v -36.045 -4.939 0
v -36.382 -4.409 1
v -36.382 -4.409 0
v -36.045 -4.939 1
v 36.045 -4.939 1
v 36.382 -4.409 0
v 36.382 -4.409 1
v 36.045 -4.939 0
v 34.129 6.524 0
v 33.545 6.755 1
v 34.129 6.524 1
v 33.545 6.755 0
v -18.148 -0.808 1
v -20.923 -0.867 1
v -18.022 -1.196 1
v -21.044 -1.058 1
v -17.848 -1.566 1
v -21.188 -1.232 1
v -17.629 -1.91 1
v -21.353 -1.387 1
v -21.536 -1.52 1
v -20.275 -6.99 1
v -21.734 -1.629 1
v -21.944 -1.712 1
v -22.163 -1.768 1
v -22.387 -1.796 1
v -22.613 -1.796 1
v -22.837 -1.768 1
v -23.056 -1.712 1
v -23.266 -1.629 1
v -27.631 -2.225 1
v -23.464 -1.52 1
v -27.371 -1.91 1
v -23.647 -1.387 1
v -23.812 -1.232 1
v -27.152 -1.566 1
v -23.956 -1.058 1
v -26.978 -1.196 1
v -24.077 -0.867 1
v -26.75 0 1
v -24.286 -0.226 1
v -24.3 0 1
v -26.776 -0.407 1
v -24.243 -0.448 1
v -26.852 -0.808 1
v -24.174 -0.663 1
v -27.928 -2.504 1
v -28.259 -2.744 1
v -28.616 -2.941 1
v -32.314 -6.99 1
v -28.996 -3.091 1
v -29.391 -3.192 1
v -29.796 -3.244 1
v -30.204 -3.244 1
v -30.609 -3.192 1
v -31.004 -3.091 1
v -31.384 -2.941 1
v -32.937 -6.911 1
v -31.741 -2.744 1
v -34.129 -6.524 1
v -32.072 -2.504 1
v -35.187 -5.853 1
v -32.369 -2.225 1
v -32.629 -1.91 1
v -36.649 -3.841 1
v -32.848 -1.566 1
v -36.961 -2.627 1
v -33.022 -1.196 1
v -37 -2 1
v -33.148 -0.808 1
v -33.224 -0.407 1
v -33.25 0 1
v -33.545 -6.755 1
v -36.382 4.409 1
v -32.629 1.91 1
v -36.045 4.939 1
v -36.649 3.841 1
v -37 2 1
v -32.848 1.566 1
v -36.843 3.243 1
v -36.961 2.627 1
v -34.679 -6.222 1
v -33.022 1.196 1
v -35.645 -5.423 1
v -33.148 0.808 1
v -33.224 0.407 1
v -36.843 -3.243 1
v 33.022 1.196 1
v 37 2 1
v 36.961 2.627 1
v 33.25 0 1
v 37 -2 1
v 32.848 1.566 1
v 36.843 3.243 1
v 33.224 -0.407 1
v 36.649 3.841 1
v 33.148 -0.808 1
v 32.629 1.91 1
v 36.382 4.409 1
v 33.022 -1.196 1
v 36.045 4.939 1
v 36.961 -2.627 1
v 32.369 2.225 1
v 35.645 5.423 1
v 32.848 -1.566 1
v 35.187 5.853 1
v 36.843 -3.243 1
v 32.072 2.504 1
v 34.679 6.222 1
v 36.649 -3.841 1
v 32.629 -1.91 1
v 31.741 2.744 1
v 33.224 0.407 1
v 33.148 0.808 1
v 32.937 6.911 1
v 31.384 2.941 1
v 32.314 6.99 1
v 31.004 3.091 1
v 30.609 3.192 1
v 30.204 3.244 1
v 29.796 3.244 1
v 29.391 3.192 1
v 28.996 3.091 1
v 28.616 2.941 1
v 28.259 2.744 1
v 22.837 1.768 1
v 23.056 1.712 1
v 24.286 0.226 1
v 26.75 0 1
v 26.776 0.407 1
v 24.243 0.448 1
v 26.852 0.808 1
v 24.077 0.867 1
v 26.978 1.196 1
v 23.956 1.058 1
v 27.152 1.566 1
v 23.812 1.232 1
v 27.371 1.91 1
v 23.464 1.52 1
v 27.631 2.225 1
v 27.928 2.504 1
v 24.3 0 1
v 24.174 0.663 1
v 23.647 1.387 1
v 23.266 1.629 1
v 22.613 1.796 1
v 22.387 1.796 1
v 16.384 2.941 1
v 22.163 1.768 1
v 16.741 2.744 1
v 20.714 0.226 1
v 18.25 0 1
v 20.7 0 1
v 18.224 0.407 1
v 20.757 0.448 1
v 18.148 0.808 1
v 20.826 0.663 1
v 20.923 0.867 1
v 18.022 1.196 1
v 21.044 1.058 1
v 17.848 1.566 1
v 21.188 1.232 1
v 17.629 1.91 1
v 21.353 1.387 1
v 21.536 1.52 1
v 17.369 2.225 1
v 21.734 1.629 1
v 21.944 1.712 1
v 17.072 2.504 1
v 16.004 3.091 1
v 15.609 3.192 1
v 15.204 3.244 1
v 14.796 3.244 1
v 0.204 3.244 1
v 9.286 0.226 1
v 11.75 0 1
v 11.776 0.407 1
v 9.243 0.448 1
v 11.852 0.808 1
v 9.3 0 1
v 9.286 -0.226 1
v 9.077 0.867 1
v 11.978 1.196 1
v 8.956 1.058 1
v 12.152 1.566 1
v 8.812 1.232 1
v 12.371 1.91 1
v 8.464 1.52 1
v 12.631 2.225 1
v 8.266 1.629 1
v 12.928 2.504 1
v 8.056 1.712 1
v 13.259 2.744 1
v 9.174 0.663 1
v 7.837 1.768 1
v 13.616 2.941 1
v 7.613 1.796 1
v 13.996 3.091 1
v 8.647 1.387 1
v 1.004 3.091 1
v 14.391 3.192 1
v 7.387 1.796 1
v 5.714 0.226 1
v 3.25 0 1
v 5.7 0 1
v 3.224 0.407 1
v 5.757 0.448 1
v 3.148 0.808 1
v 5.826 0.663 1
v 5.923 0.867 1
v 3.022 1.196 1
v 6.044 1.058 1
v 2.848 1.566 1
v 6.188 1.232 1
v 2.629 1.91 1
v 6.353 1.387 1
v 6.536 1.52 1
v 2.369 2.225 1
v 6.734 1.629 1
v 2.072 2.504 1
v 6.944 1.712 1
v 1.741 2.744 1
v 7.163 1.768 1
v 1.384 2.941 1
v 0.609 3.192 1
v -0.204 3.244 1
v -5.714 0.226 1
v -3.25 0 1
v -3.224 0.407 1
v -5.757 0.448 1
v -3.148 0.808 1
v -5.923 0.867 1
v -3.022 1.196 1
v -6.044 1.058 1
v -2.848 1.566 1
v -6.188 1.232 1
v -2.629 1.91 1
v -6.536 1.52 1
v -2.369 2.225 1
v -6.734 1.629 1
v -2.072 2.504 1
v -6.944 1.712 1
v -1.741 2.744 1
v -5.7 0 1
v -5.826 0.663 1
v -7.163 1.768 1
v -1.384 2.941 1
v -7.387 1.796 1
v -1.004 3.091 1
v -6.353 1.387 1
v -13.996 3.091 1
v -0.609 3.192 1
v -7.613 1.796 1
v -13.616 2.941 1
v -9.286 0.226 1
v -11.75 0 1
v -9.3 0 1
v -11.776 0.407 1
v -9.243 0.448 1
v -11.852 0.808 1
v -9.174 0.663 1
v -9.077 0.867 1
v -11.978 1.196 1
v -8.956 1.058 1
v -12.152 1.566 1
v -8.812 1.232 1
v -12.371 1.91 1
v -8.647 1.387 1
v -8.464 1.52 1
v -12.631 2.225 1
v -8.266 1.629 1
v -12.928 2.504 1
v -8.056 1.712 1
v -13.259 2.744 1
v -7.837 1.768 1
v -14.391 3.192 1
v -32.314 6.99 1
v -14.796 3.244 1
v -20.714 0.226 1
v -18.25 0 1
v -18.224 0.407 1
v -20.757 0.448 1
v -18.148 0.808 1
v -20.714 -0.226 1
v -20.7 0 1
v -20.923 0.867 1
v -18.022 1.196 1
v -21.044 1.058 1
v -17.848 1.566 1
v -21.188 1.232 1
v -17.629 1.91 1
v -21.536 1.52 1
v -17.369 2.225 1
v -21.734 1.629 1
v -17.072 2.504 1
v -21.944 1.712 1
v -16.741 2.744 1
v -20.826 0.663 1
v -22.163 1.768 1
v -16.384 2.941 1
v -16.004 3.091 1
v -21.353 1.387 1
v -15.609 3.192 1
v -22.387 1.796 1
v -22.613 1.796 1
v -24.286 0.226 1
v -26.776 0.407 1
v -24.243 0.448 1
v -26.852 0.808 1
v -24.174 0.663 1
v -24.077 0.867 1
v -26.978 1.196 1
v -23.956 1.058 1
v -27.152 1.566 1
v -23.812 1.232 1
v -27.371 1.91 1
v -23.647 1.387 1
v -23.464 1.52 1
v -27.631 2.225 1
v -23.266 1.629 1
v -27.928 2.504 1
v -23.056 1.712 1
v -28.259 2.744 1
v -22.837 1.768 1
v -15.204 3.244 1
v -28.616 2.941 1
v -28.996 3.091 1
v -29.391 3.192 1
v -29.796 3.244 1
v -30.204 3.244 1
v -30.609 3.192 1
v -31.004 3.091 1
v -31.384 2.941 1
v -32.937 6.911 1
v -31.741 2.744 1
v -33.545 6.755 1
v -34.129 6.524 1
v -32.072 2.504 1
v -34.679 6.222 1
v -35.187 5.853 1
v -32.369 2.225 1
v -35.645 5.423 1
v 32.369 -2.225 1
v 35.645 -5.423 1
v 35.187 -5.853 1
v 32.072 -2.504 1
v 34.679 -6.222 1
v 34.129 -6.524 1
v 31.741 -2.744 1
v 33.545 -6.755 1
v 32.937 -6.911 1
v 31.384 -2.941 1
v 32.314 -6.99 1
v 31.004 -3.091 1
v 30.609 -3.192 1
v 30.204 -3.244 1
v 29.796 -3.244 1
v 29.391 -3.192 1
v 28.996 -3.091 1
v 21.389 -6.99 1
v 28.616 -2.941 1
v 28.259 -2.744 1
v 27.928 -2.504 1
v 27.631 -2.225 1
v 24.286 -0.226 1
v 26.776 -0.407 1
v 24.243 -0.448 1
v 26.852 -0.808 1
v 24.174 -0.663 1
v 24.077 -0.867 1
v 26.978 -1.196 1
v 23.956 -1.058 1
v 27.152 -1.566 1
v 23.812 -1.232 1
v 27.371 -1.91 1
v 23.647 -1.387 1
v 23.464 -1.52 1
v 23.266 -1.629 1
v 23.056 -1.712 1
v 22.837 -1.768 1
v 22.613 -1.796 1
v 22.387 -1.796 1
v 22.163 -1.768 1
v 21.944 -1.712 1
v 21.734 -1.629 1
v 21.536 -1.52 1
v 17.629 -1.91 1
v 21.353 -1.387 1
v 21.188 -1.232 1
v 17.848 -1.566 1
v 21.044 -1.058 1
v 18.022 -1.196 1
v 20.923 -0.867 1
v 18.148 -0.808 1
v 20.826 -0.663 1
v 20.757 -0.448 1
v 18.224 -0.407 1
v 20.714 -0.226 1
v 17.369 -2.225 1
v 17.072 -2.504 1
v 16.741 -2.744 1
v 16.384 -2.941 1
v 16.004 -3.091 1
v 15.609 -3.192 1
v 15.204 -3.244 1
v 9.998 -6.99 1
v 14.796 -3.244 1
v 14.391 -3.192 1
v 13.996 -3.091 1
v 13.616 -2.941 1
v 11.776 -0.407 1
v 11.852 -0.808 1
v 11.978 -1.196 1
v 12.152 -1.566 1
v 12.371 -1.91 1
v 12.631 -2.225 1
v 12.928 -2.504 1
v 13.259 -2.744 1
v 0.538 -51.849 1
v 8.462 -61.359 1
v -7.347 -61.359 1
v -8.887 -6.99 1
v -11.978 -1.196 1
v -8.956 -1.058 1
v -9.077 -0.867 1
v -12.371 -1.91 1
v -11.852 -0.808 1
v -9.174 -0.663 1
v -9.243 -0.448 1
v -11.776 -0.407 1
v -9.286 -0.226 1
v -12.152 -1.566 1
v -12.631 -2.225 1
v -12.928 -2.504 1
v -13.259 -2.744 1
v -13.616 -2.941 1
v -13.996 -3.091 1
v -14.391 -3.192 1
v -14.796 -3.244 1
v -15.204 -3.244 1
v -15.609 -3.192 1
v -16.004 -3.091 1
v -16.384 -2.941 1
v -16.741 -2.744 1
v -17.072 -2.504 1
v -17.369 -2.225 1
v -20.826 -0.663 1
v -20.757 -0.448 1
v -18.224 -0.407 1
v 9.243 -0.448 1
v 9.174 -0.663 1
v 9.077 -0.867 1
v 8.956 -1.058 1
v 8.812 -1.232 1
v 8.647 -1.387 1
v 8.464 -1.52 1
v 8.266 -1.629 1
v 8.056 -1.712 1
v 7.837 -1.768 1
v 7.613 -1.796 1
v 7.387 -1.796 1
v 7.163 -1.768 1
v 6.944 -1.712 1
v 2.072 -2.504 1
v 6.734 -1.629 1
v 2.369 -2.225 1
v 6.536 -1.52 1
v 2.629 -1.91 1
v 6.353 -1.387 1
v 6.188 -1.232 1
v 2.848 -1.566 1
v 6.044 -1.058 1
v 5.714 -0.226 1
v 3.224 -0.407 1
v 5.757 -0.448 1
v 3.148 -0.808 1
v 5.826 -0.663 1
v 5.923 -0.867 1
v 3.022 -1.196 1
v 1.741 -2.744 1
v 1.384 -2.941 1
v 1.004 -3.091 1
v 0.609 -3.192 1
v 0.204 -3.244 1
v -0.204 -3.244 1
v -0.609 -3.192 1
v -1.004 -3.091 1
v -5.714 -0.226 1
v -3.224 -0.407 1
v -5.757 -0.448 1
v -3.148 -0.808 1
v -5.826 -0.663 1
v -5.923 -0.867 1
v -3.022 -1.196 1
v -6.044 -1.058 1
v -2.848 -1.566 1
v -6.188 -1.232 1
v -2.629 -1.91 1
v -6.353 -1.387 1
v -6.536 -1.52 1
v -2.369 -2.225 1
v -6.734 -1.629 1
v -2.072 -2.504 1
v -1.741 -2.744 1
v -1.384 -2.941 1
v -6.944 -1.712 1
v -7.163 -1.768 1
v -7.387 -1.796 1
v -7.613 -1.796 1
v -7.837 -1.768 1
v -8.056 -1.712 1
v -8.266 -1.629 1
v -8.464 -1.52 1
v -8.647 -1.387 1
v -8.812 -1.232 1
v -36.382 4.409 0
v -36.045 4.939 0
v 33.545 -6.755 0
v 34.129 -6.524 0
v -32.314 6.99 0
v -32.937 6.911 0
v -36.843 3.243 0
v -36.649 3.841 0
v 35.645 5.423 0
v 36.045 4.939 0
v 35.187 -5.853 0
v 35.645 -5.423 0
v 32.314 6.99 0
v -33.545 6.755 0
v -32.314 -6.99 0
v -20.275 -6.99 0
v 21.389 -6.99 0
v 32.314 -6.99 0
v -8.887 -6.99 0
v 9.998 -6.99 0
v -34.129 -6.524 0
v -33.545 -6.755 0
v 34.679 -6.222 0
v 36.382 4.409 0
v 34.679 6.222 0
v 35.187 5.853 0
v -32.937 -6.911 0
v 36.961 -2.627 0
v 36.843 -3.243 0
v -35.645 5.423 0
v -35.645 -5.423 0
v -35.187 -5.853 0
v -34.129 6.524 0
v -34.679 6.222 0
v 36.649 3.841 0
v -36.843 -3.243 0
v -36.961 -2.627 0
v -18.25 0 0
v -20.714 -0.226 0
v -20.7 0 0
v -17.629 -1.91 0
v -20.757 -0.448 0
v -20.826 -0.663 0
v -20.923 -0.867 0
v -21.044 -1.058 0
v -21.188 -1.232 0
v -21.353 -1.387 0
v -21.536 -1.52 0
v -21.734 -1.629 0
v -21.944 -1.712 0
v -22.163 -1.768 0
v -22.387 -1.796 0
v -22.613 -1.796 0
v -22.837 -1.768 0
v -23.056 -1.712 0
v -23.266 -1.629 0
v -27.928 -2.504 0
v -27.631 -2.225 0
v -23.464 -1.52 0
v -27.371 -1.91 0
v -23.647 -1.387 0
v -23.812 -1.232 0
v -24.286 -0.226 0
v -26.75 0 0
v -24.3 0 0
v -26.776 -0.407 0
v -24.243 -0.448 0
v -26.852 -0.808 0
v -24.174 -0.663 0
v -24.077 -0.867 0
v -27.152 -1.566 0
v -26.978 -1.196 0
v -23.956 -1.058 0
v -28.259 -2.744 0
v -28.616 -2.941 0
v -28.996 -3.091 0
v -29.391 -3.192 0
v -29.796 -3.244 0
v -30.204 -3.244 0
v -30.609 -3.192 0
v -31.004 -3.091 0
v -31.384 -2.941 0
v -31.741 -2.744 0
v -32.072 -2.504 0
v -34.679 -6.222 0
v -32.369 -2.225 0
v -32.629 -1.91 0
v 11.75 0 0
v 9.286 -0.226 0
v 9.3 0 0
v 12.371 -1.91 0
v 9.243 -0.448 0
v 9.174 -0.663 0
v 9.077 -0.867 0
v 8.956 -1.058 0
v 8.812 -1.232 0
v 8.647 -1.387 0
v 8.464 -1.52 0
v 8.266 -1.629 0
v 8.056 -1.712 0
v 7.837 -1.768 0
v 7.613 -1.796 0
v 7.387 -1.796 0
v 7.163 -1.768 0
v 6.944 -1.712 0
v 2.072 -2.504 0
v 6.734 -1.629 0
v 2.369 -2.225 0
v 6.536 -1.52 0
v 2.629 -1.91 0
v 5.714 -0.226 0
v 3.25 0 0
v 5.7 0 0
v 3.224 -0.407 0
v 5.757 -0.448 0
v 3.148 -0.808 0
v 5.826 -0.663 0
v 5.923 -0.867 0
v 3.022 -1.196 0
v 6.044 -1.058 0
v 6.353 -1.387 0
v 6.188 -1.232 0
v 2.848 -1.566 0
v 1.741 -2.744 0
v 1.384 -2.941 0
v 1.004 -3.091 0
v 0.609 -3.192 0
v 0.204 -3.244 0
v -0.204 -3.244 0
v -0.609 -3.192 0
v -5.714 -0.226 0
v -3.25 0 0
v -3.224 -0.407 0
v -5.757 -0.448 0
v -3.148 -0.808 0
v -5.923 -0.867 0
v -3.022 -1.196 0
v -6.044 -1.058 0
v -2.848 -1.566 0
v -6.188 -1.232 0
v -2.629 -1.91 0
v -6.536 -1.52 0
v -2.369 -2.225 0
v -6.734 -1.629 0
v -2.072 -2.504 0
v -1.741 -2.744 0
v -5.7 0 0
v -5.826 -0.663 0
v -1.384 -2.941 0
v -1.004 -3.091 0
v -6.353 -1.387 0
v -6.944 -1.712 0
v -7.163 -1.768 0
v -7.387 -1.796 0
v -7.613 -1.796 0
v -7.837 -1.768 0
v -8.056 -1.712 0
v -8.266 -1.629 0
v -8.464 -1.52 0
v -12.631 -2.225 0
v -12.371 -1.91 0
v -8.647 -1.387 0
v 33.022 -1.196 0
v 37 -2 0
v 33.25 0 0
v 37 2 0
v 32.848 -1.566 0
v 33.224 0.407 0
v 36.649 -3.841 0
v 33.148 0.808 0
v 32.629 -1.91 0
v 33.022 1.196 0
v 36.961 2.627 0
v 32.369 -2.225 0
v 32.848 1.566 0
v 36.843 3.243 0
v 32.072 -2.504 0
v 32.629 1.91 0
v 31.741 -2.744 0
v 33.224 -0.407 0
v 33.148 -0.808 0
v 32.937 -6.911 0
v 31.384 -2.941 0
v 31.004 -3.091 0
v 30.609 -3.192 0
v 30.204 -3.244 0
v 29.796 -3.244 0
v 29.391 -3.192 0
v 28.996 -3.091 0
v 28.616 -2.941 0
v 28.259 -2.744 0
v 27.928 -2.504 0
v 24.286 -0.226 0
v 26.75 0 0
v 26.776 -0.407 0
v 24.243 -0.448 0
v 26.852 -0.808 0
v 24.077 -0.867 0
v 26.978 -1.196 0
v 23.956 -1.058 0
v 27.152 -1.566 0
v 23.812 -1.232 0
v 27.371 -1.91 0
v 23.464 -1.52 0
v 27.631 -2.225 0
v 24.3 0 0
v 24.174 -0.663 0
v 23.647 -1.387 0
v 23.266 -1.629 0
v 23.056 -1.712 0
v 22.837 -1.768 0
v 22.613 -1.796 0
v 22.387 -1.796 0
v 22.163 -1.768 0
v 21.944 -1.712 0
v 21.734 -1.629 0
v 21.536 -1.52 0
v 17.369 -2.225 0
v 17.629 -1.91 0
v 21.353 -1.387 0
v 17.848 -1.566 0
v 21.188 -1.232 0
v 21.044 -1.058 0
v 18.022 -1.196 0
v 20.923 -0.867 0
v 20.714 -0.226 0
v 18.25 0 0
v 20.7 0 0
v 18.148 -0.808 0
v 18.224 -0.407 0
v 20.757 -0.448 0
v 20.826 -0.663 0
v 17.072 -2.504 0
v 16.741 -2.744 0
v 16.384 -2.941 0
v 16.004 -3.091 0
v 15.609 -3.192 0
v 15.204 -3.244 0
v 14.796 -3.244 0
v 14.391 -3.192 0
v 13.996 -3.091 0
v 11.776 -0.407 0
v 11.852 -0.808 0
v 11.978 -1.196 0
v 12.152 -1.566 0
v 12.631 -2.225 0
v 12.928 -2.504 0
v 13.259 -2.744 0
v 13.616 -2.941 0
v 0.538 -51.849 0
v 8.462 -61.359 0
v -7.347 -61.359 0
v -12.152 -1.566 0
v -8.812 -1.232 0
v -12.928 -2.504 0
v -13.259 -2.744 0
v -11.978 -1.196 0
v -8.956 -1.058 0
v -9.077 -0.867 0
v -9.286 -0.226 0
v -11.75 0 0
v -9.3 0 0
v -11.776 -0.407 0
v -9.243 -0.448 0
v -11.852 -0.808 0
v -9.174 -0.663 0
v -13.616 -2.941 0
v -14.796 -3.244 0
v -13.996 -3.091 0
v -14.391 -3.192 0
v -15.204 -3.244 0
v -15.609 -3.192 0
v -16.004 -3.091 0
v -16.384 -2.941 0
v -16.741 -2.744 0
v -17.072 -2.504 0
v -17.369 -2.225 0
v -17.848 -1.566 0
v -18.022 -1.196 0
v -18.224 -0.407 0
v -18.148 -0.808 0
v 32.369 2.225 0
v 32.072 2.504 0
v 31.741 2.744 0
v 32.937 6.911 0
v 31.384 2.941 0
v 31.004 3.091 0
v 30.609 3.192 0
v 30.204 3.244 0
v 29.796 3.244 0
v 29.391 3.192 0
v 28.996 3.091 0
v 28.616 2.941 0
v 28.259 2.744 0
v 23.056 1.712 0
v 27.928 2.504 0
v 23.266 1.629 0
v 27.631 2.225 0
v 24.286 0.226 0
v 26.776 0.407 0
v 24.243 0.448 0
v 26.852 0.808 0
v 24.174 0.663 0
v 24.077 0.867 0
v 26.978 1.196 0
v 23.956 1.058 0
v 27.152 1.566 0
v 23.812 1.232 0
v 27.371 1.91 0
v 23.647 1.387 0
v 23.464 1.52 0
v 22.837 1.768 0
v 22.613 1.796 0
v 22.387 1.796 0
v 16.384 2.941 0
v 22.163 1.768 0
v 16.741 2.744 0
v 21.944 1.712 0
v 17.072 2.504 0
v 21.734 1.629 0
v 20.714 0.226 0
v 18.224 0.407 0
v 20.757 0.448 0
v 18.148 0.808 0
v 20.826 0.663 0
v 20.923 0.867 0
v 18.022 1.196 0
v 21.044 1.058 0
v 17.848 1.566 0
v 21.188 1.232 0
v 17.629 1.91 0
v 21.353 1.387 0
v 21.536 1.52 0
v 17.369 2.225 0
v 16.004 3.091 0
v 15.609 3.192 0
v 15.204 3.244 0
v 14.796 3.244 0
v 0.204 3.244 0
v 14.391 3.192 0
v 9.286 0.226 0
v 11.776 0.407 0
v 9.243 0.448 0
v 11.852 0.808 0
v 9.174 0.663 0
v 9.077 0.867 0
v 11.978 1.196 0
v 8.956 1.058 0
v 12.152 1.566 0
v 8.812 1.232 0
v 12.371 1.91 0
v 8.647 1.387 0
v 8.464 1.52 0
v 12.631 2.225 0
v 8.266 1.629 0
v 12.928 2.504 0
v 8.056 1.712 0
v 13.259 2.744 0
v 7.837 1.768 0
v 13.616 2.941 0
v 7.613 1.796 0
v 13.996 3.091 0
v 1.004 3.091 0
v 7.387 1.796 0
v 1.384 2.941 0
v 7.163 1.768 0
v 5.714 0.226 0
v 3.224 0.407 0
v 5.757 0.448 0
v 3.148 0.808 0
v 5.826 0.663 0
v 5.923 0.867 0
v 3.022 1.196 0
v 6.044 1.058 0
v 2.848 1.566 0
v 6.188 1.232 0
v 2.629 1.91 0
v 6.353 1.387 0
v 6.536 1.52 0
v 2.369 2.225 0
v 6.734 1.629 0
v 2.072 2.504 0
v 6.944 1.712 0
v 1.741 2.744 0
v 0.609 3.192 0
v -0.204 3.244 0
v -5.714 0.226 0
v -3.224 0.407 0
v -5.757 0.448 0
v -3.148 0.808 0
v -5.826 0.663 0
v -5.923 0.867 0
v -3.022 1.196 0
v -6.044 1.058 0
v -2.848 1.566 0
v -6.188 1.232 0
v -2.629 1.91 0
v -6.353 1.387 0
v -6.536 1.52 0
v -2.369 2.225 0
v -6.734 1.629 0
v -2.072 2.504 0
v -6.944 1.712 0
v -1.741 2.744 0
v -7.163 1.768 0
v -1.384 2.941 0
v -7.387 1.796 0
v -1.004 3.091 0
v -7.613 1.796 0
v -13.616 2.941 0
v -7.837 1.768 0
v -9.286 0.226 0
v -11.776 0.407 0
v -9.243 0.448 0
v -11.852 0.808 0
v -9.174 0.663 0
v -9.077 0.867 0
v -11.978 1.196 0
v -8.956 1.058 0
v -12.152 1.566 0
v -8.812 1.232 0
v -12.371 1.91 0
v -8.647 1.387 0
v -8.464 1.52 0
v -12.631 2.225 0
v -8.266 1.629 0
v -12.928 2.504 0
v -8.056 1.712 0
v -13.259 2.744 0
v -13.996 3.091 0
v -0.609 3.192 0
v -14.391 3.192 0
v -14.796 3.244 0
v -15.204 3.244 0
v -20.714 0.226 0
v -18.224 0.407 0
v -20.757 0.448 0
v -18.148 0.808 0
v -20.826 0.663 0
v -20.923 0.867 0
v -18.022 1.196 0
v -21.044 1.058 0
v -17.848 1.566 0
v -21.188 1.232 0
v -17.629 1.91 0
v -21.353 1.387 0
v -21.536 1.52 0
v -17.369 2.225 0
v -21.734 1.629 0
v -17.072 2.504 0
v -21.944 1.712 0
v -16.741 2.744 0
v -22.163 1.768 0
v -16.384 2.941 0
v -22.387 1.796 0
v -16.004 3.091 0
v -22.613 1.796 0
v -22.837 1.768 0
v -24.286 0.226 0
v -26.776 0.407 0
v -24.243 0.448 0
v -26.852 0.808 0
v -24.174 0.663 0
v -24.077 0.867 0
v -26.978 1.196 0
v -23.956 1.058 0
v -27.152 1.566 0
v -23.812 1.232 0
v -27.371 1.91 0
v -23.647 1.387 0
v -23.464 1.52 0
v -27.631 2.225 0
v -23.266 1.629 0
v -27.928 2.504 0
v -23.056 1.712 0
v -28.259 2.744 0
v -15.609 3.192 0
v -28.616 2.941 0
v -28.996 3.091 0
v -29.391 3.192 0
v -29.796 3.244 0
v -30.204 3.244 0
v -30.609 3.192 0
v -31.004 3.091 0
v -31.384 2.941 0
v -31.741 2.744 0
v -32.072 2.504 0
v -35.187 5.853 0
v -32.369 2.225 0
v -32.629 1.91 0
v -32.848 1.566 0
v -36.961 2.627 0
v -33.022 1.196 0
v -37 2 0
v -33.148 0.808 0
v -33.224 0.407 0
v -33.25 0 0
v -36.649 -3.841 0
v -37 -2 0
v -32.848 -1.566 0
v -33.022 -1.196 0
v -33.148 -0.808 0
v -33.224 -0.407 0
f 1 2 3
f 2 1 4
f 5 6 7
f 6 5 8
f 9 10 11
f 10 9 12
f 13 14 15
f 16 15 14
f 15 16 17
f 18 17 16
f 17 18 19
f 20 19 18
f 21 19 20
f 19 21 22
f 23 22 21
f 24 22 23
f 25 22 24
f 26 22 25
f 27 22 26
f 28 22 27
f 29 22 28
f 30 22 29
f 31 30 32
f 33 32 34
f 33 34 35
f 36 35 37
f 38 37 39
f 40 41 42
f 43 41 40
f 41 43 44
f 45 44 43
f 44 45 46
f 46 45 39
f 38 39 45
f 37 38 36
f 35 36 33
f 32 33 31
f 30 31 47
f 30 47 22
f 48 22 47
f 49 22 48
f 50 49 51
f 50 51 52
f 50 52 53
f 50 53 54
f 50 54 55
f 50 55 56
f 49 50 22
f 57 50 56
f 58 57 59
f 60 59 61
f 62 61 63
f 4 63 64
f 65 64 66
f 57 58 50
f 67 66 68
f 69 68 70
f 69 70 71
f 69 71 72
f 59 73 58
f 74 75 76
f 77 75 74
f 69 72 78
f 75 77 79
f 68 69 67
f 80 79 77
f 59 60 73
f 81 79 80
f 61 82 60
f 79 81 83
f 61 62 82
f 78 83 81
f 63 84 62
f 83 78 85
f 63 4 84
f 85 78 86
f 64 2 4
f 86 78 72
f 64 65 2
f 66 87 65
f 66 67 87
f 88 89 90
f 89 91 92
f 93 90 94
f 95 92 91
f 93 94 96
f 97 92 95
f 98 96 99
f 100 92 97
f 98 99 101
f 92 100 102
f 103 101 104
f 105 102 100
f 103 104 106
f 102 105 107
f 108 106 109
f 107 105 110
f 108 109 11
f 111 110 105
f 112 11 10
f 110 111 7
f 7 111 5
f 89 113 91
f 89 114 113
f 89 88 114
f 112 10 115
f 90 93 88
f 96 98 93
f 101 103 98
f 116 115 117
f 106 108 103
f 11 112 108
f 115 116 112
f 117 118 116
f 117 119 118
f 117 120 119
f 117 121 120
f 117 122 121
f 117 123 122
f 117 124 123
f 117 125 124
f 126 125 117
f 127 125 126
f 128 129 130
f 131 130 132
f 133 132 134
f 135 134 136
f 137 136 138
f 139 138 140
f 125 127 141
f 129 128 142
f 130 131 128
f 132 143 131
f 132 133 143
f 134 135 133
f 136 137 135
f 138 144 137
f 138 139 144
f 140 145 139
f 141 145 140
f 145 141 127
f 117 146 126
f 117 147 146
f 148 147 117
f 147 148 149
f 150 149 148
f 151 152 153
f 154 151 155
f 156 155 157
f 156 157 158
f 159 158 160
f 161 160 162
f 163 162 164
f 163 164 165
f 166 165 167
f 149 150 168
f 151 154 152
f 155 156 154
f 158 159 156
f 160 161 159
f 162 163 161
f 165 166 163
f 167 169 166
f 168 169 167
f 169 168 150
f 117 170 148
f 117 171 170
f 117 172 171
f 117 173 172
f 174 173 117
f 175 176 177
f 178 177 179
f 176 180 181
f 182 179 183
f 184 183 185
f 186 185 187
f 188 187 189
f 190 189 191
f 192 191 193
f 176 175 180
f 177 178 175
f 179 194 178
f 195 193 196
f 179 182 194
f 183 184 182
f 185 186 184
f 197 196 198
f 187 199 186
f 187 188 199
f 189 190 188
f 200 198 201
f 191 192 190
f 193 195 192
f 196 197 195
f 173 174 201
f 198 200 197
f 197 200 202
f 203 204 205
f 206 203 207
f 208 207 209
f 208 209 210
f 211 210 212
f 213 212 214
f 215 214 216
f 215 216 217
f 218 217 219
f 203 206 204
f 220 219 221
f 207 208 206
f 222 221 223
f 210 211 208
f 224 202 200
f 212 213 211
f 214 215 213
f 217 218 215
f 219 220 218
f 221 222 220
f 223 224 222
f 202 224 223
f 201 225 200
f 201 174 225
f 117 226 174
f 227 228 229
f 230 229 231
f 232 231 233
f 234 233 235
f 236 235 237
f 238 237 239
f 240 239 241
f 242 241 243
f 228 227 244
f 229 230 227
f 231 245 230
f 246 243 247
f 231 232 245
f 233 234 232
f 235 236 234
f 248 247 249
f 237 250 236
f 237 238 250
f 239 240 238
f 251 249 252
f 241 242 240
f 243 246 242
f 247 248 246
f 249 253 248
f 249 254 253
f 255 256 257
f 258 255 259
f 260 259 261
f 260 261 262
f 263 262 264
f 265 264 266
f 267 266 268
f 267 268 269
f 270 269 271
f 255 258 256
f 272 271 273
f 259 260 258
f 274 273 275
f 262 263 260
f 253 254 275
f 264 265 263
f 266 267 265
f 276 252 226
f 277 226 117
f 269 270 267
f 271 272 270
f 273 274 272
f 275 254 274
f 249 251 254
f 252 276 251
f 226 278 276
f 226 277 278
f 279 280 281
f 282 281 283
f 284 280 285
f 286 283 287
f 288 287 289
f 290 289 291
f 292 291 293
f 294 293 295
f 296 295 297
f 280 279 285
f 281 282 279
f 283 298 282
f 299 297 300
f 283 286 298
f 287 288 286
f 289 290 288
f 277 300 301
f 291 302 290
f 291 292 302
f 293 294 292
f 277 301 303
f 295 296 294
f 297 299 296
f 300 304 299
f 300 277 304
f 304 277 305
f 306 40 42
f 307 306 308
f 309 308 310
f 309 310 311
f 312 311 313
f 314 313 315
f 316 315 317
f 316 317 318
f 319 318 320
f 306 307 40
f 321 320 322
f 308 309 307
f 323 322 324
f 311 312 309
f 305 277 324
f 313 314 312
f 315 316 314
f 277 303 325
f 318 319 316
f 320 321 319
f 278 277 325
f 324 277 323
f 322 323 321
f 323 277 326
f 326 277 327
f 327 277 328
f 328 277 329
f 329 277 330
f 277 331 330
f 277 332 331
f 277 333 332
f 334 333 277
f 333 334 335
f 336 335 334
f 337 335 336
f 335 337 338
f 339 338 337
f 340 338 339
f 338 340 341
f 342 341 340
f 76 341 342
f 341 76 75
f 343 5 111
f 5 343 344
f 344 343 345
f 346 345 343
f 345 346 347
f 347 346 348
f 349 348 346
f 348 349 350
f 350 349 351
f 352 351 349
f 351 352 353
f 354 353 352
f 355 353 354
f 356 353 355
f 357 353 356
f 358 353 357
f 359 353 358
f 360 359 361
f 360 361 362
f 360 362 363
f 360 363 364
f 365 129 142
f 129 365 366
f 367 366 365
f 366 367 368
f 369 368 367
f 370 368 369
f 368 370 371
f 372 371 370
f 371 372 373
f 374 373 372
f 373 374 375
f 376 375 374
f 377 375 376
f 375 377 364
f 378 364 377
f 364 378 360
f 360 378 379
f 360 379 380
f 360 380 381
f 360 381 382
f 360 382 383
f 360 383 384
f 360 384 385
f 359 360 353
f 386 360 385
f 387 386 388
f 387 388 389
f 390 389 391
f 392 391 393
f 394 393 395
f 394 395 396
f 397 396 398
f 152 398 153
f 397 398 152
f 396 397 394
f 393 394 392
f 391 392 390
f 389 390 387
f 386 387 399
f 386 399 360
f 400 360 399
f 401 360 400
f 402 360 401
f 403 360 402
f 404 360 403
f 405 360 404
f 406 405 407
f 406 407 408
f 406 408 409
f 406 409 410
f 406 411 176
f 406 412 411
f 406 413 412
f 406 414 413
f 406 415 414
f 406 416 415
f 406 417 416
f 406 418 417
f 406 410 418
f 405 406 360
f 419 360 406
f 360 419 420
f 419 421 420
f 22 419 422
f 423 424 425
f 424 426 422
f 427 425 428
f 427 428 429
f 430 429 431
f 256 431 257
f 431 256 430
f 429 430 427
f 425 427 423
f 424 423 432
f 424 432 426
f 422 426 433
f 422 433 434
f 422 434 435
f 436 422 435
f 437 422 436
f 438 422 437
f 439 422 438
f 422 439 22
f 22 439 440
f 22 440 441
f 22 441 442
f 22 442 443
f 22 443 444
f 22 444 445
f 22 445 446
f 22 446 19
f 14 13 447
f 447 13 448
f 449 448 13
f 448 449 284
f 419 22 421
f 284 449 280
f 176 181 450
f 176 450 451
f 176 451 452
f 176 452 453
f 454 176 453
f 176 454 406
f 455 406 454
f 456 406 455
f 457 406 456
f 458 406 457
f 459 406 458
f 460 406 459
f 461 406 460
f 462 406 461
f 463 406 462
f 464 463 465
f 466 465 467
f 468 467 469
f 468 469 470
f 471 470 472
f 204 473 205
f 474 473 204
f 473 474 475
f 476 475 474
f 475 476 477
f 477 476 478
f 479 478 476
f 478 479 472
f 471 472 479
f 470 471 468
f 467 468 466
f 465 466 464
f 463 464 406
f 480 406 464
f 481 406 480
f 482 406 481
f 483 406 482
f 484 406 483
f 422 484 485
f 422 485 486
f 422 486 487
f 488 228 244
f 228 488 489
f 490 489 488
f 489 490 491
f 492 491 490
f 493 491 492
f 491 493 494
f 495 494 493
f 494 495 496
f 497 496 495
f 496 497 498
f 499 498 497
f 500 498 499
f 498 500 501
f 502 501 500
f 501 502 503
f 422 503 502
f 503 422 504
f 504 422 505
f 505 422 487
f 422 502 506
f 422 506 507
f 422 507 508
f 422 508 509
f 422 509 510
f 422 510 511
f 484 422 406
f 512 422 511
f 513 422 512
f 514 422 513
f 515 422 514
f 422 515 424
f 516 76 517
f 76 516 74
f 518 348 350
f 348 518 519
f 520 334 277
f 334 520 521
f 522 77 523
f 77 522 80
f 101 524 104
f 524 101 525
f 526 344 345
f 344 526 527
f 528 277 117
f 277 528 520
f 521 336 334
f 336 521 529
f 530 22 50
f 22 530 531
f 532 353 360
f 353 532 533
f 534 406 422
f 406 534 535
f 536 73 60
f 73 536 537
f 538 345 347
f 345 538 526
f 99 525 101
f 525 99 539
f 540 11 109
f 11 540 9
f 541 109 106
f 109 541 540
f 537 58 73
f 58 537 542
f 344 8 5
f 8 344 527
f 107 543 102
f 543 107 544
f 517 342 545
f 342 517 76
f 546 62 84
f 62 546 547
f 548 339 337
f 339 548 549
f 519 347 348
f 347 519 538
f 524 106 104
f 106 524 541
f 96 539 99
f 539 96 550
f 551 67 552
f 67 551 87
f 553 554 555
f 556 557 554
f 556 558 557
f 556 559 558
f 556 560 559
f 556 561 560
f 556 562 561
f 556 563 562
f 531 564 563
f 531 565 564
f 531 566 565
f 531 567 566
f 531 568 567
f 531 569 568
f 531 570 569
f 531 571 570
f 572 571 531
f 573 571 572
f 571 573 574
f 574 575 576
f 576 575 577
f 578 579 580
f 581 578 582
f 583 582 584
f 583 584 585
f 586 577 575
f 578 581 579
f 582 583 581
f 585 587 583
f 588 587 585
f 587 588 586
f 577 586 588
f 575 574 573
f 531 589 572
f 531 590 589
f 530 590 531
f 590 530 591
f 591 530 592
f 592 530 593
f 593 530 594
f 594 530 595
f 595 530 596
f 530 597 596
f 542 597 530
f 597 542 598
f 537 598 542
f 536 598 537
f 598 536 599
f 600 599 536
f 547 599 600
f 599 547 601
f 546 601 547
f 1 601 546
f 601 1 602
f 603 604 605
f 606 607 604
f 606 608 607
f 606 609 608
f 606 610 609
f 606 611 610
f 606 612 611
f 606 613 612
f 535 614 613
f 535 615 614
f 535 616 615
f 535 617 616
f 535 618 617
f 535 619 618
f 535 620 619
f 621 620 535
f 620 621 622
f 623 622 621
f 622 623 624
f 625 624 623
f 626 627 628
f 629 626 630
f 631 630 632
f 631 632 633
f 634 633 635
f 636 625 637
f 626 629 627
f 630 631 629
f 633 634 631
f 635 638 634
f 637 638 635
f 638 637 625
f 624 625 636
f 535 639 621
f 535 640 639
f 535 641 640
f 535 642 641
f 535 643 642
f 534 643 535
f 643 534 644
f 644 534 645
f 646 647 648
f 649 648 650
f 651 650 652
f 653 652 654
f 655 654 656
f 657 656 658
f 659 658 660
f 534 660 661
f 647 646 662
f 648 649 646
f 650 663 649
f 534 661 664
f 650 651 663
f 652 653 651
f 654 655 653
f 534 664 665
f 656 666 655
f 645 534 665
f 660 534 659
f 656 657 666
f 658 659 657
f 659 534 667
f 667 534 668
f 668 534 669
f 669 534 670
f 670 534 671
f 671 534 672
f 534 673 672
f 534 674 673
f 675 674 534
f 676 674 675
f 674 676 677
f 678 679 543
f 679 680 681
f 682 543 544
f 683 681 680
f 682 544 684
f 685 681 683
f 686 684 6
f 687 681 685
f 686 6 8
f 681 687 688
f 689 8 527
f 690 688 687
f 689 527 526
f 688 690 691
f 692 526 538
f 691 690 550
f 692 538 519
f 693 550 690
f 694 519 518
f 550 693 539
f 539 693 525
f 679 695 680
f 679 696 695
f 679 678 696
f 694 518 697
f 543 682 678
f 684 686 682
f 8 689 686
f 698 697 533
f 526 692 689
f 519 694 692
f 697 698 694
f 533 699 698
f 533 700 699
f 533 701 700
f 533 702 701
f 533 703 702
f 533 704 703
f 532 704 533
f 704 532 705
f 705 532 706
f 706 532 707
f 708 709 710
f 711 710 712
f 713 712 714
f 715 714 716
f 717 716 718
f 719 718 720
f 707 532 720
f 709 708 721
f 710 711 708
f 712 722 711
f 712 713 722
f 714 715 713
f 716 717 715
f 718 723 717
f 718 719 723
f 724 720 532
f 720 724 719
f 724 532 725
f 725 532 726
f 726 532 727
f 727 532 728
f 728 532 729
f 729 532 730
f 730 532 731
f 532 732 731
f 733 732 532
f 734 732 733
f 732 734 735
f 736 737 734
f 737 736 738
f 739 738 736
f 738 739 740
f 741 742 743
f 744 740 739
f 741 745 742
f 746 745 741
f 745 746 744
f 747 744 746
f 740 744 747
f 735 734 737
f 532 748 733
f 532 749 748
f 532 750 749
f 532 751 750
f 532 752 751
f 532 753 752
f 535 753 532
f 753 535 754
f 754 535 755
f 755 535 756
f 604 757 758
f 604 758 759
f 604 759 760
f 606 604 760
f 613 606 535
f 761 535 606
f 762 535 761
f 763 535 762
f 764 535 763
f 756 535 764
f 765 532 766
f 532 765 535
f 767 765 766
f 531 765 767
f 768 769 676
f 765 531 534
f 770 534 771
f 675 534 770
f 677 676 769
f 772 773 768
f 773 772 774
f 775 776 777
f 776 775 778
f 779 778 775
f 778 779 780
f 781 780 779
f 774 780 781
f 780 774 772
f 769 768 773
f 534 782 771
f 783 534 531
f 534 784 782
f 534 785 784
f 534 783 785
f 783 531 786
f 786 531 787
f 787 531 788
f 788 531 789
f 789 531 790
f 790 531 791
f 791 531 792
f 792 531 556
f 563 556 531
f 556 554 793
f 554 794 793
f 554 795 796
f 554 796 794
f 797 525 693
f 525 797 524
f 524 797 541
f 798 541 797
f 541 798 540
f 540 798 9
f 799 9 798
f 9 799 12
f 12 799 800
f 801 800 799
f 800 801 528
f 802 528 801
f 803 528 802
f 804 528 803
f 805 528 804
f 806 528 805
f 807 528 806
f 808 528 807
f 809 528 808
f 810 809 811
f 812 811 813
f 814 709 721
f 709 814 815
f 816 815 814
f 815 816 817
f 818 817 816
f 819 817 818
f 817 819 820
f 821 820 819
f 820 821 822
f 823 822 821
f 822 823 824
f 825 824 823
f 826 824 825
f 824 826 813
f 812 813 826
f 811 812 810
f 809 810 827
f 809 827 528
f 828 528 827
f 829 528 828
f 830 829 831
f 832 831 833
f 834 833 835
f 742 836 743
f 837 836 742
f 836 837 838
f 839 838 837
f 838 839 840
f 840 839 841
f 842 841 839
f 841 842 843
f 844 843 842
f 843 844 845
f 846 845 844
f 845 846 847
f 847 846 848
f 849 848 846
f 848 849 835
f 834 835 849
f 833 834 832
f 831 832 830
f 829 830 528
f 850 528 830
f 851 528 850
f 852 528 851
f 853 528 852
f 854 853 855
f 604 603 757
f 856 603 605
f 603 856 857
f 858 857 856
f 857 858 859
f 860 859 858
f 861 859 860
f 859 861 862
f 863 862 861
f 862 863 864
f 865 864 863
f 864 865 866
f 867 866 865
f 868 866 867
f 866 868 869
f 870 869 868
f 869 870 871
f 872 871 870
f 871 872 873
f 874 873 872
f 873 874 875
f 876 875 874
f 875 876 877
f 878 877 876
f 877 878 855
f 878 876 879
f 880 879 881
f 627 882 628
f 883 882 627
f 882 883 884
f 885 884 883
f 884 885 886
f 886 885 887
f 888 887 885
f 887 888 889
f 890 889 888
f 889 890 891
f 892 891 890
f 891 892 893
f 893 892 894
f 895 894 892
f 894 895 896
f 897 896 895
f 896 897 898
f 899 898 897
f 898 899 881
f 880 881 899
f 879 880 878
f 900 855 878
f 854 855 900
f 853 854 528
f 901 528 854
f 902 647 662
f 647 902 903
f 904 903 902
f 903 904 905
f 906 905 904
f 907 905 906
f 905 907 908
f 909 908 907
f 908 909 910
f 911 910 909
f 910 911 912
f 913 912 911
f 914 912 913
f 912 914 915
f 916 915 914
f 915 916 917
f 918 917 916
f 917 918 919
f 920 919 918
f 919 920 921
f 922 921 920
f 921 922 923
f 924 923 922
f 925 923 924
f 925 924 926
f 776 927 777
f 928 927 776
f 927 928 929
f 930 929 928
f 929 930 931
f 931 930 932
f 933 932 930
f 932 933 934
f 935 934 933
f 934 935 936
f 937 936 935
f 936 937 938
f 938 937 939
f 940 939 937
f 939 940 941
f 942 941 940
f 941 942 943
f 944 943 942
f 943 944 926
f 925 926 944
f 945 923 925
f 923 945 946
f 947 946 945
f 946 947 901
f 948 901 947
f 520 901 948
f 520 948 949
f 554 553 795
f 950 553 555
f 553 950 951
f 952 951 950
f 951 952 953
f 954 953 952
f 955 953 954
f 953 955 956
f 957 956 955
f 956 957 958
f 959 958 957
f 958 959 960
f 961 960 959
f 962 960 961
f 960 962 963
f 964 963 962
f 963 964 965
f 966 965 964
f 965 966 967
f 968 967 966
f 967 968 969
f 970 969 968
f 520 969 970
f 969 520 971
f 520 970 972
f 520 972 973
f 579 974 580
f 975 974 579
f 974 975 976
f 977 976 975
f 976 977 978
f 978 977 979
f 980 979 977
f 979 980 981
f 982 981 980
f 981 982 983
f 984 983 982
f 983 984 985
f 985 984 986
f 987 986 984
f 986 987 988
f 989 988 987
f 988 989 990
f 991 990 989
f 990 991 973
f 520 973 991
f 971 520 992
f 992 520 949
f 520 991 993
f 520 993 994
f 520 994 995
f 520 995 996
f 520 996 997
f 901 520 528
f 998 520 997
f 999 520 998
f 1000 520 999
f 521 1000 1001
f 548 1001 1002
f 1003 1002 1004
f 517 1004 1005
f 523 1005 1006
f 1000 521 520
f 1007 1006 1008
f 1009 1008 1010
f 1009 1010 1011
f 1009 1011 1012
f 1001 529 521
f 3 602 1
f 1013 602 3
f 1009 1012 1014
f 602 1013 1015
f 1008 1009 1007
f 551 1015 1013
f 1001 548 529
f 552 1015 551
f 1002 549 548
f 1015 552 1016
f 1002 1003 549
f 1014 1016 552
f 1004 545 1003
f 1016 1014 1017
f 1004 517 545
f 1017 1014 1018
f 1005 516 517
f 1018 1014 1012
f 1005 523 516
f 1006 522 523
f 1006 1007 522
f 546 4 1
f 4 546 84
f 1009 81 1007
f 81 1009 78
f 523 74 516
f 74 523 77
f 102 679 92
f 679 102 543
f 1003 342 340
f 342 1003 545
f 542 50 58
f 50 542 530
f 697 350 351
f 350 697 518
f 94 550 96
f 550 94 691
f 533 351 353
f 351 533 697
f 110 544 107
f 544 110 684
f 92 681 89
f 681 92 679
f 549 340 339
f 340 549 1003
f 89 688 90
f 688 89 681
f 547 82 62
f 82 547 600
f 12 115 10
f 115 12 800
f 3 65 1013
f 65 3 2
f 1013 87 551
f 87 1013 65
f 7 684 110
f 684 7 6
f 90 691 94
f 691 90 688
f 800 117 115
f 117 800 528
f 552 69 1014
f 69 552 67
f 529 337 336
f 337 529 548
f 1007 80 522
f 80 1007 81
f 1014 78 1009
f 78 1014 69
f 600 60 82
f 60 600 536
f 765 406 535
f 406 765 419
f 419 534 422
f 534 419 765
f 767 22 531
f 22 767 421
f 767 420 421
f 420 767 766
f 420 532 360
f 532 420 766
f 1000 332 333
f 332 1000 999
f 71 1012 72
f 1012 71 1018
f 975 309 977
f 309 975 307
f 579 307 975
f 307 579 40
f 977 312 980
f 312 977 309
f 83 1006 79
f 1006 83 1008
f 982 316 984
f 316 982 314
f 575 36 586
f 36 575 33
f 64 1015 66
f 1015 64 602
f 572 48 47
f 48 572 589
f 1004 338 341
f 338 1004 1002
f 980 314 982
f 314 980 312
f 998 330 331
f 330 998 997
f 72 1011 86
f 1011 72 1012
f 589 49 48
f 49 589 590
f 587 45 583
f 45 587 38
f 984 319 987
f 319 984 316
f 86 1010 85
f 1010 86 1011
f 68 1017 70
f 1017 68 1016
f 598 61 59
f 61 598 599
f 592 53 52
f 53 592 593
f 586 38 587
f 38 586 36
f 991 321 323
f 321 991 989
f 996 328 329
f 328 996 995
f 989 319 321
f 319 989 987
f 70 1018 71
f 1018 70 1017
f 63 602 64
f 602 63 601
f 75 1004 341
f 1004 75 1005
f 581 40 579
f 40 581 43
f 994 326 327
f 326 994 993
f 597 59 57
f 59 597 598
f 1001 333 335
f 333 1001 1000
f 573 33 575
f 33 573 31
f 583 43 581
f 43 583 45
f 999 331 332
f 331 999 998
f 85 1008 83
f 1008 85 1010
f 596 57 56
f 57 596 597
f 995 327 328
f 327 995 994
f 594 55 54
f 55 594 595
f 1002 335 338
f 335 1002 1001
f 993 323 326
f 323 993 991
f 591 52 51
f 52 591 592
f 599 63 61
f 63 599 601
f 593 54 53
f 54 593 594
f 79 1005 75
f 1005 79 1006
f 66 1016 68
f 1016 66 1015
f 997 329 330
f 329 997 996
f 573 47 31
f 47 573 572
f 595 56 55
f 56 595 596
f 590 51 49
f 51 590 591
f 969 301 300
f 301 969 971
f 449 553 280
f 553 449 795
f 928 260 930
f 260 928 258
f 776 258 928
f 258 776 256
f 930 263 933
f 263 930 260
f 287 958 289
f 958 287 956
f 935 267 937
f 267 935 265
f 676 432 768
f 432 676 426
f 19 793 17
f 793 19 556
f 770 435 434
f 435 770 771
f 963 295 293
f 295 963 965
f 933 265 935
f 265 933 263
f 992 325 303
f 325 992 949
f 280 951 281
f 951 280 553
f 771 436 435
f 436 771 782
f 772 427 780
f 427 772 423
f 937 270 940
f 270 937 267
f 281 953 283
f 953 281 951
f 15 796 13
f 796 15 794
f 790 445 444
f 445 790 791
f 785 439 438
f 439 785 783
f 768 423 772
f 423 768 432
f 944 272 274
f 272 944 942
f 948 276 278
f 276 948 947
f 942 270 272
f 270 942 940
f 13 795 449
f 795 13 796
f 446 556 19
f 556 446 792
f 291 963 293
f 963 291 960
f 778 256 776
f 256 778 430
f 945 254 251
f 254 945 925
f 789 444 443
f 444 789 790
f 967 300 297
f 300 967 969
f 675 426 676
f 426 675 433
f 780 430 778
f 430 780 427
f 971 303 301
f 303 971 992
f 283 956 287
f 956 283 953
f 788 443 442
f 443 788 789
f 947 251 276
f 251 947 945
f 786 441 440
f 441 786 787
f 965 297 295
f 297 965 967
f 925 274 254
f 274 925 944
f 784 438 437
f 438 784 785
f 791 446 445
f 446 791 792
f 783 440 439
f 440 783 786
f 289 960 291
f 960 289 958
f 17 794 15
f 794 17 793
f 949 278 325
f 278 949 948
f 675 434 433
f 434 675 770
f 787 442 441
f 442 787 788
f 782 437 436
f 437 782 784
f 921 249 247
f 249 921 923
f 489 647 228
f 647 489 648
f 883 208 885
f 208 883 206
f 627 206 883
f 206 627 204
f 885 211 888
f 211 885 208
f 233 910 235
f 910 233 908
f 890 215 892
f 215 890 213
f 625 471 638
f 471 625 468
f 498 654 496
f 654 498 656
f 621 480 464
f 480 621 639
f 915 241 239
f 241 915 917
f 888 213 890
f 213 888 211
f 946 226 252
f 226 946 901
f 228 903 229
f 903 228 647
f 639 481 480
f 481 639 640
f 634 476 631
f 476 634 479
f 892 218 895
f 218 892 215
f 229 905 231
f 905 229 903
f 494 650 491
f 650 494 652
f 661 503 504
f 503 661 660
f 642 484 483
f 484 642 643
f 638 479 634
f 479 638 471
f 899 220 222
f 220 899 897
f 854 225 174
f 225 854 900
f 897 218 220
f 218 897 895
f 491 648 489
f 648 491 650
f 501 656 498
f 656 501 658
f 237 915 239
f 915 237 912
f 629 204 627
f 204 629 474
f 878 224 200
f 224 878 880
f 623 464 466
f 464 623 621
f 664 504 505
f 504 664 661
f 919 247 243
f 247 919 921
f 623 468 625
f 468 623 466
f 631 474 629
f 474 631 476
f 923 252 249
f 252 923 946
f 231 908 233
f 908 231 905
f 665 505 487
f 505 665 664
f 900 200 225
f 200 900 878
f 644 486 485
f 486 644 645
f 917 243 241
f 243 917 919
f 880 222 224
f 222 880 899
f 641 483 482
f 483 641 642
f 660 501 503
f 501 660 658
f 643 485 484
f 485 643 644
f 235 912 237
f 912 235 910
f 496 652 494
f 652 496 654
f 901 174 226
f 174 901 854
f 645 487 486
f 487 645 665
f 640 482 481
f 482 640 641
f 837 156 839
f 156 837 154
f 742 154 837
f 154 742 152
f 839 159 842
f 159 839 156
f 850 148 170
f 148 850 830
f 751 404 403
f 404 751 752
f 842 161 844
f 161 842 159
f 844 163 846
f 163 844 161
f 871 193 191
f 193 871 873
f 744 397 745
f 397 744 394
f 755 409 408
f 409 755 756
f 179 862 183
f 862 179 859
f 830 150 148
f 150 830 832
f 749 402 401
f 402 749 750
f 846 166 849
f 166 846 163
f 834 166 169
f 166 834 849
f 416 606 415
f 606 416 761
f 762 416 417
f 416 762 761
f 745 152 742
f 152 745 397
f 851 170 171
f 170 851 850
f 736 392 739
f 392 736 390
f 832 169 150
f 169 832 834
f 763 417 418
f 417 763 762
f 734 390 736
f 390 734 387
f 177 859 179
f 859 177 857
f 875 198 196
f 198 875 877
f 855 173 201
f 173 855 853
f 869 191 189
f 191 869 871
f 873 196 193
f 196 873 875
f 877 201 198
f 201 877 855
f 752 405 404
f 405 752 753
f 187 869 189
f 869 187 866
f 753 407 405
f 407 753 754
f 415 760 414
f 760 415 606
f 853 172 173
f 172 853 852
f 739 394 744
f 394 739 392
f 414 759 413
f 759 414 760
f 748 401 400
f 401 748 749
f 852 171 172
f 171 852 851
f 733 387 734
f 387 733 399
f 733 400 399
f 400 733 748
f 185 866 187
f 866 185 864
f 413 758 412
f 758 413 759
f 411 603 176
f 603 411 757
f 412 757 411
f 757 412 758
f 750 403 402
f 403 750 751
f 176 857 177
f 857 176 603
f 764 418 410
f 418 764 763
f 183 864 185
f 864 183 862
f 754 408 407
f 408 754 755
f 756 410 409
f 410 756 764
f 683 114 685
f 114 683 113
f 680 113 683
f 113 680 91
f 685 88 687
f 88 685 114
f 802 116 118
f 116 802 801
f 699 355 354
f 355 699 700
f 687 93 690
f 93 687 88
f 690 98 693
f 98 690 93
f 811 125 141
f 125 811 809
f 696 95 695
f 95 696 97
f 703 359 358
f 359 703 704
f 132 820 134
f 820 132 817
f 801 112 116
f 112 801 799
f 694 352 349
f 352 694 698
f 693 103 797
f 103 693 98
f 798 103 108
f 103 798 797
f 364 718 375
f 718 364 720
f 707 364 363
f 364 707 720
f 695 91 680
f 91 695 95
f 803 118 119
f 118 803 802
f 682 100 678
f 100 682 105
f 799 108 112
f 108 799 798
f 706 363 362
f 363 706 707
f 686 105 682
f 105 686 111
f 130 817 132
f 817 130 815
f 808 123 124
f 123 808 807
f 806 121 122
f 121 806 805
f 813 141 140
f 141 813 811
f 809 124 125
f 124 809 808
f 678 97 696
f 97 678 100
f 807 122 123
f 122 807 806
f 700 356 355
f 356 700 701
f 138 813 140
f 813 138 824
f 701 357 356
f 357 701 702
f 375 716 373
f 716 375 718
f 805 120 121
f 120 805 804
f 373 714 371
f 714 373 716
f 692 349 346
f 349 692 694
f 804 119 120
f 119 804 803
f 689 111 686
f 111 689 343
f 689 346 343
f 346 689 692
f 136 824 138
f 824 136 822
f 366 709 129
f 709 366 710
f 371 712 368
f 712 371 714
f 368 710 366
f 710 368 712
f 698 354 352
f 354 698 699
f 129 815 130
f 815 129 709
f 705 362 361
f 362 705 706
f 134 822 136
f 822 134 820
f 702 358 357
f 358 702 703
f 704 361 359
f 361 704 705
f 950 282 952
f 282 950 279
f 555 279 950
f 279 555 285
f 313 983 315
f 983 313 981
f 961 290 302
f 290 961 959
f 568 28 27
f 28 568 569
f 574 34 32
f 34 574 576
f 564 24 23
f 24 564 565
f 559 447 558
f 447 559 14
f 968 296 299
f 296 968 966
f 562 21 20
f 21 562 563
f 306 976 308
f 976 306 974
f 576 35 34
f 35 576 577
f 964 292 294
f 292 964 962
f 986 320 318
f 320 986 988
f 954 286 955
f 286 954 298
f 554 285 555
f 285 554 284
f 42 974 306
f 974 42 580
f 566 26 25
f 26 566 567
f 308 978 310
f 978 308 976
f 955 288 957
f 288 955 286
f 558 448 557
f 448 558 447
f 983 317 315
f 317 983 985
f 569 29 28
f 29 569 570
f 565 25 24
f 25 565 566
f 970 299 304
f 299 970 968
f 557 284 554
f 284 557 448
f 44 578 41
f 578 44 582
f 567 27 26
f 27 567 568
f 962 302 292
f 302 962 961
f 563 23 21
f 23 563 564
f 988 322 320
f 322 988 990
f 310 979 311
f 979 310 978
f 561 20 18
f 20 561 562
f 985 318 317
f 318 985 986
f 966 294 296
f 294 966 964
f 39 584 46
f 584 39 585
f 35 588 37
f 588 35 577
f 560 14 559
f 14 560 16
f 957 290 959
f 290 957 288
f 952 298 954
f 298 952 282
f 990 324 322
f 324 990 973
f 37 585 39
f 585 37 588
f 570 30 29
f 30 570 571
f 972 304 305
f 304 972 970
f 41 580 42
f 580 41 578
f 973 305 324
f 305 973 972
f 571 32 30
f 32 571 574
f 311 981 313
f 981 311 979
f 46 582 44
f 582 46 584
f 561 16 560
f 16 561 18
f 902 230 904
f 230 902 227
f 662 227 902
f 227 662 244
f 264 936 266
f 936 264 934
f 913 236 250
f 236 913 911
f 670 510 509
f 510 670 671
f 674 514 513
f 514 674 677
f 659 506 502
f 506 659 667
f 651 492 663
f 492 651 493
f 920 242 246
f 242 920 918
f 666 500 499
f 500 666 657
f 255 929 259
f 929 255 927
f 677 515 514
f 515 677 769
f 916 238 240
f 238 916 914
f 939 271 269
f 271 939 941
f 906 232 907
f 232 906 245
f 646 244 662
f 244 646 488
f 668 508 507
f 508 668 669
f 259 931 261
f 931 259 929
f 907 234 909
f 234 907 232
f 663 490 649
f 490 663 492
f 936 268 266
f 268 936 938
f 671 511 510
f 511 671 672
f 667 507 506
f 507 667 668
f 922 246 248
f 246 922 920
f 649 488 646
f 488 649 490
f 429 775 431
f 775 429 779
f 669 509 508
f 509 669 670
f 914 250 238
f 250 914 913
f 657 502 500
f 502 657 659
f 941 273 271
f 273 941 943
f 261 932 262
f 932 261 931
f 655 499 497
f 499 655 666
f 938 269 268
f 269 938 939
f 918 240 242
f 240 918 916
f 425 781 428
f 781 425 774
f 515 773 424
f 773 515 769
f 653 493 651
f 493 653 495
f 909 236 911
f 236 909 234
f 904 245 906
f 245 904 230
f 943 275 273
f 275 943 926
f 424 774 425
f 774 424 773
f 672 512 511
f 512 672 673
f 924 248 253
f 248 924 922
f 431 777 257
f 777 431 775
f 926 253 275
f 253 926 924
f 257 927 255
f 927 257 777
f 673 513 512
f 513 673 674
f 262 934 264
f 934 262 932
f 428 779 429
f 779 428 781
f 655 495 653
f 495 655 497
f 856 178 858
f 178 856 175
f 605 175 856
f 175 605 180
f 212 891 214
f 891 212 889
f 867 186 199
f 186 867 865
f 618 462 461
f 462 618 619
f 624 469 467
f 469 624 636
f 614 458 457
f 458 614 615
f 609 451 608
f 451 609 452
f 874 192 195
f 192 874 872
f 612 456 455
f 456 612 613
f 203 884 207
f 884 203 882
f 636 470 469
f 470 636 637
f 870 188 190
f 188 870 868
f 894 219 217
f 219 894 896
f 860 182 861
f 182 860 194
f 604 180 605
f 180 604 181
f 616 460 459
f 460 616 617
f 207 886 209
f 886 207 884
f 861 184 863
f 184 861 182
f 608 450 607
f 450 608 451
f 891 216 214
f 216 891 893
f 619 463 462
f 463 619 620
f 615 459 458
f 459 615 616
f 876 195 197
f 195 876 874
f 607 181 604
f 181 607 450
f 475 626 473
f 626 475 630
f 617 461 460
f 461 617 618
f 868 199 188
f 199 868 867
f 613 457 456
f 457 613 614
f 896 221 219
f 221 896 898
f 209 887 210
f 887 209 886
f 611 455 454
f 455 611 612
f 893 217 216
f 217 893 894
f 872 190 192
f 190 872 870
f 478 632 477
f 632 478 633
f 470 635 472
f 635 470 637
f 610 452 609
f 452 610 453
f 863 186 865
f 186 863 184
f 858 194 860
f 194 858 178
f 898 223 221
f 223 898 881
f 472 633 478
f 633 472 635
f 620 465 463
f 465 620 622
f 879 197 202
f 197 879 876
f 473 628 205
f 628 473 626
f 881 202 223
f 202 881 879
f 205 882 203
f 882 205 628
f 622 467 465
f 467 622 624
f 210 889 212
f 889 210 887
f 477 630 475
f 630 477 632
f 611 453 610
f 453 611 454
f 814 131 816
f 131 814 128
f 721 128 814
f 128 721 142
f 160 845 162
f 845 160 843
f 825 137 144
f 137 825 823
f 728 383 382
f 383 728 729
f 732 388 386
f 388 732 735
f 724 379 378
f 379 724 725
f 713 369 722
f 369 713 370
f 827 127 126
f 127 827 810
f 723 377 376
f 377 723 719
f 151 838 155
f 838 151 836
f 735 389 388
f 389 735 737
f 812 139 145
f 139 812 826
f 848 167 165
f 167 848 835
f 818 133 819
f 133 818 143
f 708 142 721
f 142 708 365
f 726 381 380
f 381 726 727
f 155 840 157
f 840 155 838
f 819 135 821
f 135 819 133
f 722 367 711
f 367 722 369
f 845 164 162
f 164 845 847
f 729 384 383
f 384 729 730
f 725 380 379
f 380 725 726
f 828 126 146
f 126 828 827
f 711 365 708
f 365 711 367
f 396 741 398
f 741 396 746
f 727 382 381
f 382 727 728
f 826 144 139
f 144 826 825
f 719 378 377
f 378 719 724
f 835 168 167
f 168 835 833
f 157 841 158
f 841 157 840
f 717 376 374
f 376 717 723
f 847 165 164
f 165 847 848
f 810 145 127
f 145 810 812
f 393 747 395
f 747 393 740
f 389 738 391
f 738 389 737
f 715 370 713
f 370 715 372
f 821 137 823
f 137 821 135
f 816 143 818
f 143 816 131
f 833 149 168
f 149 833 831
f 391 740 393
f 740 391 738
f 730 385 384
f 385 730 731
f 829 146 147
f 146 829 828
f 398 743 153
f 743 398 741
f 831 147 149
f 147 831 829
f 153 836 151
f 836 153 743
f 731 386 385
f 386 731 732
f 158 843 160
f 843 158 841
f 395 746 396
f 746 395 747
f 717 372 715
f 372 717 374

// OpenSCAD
$fn = 50;


difference() {
	union() {
		hull() {
			translate(v = [-32.0000000000, 2.0000000000, 0]) {
				cylinder(h = 1, r = 5);
			}
			translate(v = [32.0000000000, 2.0000000000, 0]) {
				cylinder(h = 1, r = 5);
			}
			translate(v = [-32.0000000000, -2.0000000000, 0]) {
				cylinder(h = 1, r = 5);
			}
			translate(v = [32.0000000000, -2.0000000000, 0]) {
				cylinder(h = 1, r = 5);
			}
		}
		translate(v = [0, -5, 0]) {
			linear_extrude(height = 1) {
				text(font = "DejaVu Sans Mono:style=Bold", halign = "center", size = 57.0000000000, text = "V", valign = "top");
			}
		}
	}
	union() {
		translate(v = [-30.0000000000, 0.0000000000, 0]) {
			translate(v = [0, 0, -100]) {
				cylinder(h = 200, r = 3.2500000000);
			}
		}
		translate(v = [-15.0000000000, 0.0000000000, 0]) {
			translate(v = [0, 0, -100]) {
				cylinder(h = 200, r = 3.2500000000);
			}
		}
		translate(v = [0, 0, -100]) {
			cylinder(h = 200, r = 3.2500000000);
		}
		translate(v = [15.0000000000, 0.0000000000, 0]) {
			translate(v = [0, 0, -100]) {
				cylinder(h = 200, r = 3.2500000000);
			}
		}
		translate(v = [30.0000000000, 0.0000000000, 0]) {
			translate(v = [0, 0, -100]) {
				cylinder(h = 200, r = 3.2500000000);
			}
		}
		translate(v = [-30.0000000000, 0.0000000000, 0]) {
			translate(v = [0, 0, -100]) {
				cylinder(h = 200, r = 1.8000000000);
			}
		}
		translate(v = [-22.5000000000, 0.0000000000, 0]) {
			translate(v = [0, 0, -100]) {
				cylinder(h = 200, r = 1.8000000000);
			}
		}
		translate(v = [-15.0000000000, 0.0000000000, 0]) {
			translate(v = [0, 0, -100]) {
				cylinder(h = 200, r = 1.8000000000);
			}
		}
		translate(v = [-7.5000000000, 0.0000000000, 0]) {
			translate(v = [0, 0, -100]) {
				cylinder(h = 200, r = 1.8000000000);
			}
		}
		translate(v = [0, 0, -100]) {
			cylinder(h = 200, r = 1.8000000000);
		}
		translate(v = [7.5000000000, 0.0000000000, 0]) {
			translate(v = [0, 0, -100]) {
				cylinder(h = 200, r = 1.8000000000);
			}
		}
		translate(v = [15.0000000000, 0.0000000000, 0]) {
			translate(v = [0, 0, -100]) {
				cylinder(h = 200, r = 1.8000000000);
			}
		}
		translate(v = [22.5000000000, 0.0000000000, 0]) {
			translate(v = [0, 0, -100]) {
				cylinder(h = 200, r = 1.8000000000);
			}
		}
		translate(v = [30.0000000000, 0.0000000000, 0]) {
			translate(v = [0, 0, -100]) {
				cylinder(h = 200, r = 1.8000000000);
			}
		}
	}
}
